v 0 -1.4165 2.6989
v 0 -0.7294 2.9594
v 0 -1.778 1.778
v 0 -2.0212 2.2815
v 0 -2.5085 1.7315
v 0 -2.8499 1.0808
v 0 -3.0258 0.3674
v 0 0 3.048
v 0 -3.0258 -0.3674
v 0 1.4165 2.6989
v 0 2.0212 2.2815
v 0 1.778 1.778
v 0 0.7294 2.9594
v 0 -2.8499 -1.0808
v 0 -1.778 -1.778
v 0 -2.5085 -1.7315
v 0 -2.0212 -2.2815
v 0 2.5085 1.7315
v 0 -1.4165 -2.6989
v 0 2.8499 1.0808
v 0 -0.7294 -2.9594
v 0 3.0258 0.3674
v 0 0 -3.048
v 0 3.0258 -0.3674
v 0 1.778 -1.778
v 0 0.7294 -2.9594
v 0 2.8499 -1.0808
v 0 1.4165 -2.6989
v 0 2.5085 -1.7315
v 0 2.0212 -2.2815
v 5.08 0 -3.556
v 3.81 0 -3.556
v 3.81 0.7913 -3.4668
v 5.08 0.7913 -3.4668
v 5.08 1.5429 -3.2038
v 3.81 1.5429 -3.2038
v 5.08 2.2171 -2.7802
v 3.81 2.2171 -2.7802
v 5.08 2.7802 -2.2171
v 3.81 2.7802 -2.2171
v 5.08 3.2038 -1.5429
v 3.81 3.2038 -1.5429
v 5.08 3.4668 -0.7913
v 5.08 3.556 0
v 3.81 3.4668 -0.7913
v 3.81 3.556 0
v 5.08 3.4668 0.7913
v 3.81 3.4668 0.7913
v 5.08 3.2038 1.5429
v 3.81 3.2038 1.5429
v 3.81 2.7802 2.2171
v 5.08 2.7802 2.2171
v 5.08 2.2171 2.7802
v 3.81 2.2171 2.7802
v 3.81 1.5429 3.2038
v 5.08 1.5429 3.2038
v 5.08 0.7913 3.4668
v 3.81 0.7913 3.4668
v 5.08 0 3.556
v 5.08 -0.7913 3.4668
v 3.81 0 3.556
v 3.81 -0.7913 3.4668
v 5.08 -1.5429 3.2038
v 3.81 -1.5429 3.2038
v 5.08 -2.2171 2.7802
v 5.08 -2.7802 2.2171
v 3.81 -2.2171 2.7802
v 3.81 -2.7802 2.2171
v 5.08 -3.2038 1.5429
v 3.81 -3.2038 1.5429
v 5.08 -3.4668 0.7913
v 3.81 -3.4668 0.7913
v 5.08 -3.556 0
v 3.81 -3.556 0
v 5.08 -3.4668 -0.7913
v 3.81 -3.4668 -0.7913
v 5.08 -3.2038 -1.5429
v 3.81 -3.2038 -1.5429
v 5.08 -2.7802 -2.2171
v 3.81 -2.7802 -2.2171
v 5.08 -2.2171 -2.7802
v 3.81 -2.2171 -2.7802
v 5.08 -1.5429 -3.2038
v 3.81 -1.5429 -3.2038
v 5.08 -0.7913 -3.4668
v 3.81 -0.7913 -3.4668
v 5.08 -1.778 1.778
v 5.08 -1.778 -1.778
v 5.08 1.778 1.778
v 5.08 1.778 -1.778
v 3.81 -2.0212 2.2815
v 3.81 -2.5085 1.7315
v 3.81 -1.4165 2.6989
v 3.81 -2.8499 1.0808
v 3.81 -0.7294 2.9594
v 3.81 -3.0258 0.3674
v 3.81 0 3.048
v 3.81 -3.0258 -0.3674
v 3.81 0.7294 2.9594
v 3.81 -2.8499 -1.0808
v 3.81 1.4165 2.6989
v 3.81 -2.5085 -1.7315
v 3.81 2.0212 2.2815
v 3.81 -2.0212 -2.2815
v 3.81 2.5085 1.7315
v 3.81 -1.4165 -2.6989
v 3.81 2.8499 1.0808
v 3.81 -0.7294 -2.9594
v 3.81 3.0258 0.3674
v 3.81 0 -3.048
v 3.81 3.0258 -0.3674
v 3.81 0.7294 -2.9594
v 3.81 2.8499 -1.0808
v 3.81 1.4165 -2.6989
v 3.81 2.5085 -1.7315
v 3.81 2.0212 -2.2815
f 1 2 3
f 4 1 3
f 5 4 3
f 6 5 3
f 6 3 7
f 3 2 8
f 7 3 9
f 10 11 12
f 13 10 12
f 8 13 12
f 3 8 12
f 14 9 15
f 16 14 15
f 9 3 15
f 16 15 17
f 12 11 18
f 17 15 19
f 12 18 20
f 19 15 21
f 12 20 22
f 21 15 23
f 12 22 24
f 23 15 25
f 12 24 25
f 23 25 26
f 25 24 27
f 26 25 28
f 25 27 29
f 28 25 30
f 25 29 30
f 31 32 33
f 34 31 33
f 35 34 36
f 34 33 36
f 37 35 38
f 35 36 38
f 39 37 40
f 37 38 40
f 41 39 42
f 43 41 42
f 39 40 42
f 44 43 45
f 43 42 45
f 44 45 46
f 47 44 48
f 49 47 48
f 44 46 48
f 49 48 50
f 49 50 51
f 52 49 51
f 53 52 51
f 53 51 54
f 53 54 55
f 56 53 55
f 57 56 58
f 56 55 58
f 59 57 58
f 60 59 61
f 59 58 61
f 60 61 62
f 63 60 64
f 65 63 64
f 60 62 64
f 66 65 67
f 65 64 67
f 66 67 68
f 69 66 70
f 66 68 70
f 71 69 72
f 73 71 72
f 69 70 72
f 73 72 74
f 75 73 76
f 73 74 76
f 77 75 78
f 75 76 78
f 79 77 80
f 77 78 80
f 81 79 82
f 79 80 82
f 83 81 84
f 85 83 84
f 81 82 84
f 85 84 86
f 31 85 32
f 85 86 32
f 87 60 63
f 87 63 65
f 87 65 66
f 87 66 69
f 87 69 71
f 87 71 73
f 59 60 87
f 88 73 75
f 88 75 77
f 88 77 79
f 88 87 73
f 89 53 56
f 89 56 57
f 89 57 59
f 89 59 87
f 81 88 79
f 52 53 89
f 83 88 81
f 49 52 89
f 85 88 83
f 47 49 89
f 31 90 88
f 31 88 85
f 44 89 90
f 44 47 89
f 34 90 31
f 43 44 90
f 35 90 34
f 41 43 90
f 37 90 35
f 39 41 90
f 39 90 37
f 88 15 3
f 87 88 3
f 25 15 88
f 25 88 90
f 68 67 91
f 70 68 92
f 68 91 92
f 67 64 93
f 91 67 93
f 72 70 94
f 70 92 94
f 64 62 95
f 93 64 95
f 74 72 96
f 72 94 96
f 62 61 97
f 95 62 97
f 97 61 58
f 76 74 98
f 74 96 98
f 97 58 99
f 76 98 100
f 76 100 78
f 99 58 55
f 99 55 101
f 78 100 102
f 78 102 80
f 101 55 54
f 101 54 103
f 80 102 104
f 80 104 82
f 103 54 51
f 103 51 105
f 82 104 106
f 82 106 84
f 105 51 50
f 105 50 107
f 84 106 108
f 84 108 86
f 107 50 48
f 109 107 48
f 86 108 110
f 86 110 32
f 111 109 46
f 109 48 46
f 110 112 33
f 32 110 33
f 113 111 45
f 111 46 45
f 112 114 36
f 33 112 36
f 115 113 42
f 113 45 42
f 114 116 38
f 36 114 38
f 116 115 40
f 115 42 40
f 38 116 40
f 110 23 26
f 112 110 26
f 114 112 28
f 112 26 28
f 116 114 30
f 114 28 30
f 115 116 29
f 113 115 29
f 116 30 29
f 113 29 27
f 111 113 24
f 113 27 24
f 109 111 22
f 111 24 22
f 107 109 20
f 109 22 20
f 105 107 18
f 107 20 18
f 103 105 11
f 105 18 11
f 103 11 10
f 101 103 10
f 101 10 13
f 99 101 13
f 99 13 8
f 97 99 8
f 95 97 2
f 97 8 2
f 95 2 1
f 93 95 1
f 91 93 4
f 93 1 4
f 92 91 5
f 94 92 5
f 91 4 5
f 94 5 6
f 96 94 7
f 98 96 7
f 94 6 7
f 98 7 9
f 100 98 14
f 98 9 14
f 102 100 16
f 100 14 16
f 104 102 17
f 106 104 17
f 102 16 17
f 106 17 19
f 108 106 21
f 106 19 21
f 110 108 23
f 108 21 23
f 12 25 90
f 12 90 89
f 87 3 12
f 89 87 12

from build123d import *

# Parameters (mm, degrees)
SKETCH2_R           = 3.048
BOSS_EXTRUDE1_DEPTH = 3.81
SKETCH3_R           = 3.556
BOSS_EXTRUDE2_DEPTH = 1.27
SKETCH4_W           = 3.556
SKETCH4_H           = 3.556
CUT_EXTRUDE1_DEPTH  = 6.08


with BuildPart() as part:
    # Sketch2 → Boss-Extrude1 (new body)
    with BuildSketch(Plane(origin=(0, 0, 0), x_dir=(0, 0, -1), z_dir=(1, 0, 0))):
        Circle(SKETCH2_R)
    extrude(amount=BOSS_EXTRUDE1_DEPTH)

    # Sketch3 → Boss-Extrude2 (add)
    with BuildSketch(Plane(origin=(3.81, 0, 0), x_dir=(0, 0, -1), z_dir=(1, 0, 0))):
        Circle(SKETCH3_R)
    extrude(amount=BOSS_EXTRUDE2_DEPTH)

    # Sketch4 → Cut-Extrude1 (cut, through all)
    with BuildSketch(Plane.ZY):
        Rectangle(SKETCH4_W, SKETCH4_H)
    extrude(amount=-CUT_EXTRUDE1_DEPTH, mode=Mode.SUBTRACT)


solid = part.part
